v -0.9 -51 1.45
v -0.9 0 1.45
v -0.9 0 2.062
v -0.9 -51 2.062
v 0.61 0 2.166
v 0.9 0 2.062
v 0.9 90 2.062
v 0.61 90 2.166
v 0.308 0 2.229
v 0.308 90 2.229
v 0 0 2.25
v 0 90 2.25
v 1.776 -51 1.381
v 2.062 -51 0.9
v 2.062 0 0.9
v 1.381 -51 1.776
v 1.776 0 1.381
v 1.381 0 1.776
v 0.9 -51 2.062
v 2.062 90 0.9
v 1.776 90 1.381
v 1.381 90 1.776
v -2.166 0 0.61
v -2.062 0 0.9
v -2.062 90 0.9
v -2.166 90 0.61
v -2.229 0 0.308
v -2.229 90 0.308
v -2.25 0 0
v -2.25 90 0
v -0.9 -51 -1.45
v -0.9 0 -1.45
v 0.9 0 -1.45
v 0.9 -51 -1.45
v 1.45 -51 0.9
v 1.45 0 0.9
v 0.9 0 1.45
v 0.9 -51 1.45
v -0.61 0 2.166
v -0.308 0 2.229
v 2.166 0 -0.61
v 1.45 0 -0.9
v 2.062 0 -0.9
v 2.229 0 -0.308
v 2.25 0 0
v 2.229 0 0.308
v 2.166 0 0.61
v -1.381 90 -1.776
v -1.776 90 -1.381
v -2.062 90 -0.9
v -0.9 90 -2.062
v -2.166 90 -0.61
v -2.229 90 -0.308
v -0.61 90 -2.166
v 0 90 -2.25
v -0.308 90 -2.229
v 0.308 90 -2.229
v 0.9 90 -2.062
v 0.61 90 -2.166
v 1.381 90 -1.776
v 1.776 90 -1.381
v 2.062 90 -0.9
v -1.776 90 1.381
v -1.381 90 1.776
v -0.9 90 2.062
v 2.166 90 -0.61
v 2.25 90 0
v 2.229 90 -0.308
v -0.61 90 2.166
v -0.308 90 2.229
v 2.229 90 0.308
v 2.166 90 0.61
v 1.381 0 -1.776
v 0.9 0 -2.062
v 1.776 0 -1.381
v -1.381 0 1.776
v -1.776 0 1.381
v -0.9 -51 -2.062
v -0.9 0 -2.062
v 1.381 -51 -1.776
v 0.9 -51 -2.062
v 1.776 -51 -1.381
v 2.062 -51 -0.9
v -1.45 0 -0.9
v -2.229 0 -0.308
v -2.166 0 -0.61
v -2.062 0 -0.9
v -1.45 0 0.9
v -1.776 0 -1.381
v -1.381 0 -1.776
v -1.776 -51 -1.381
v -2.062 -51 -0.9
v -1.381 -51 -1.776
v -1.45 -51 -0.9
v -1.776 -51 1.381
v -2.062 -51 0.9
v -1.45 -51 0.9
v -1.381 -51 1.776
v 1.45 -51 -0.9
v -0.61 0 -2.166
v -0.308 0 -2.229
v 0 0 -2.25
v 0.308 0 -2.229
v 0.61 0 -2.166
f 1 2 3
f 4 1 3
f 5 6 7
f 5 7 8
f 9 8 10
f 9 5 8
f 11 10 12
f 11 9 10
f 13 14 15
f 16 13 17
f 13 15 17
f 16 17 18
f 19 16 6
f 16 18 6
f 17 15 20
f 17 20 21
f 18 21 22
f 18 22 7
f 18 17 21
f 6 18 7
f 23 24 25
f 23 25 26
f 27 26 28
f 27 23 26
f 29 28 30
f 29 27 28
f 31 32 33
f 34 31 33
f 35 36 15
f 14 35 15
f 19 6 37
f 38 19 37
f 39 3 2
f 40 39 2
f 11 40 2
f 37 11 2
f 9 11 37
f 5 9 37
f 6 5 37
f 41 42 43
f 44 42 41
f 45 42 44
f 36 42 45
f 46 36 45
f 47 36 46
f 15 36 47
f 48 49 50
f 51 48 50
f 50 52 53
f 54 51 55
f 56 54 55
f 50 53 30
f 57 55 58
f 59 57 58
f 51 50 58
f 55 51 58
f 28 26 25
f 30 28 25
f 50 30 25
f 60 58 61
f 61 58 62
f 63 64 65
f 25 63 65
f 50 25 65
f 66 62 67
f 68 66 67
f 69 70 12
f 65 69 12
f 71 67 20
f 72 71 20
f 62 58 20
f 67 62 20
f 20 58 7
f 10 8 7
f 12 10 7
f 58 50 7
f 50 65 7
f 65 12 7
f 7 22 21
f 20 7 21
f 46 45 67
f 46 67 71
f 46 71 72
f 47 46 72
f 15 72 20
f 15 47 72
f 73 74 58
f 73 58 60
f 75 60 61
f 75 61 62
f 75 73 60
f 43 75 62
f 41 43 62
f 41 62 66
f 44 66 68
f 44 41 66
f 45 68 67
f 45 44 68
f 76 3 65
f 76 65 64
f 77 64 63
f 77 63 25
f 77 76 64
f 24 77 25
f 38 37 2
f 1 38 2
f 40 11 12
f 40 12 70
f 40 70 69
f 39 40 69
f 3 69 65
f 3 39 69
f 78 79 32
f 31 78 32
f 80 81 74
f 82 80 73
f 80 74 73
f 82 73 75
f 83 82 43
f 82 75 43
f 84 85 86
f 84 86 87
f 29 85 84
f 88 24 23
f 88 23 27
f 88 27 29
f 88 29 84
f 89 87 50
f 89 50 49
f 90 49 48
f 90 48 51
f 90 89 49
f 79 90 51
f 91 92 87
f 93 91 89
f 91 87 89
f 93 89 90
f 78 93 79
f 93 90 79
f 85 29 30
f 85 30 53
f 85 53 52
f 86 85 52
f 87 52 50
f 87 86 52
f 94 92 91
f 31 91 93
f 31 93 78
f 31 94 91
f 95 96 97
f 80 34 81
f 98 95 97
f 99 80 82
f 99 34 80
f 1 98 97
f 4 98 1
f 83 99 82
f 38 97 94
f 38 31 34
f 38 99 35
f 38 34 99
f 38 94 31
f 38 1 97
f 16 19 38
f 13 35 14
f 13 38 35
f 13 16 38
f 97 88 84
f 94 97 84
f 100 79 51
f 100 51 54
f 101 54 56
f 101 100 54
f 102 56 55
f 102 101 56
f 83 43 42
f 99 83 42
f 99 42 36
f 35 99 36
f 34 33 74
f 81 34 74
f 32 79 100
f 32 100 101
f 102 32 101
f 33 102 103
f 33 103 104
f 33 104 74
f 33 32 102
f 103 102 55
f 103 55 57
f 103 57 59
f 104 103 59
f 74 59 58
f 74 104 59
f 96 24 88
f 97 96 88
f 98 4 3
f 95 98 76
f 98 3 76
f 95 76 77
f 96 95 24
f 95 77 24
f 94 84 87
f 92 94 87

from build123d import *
from build123d import SkipClean  # not in build123d's __all__

# Parameters (mm, degrees)
F1_DEPTH = 51
F2_DEPTH = 90


with BuildPart() as f1:
    # F0 (on Front) → F1 (new body)
    with BuildSketch(Plane.XZ):
        with BuildLine():
            Line((1.45, 0.9), (2.0621590627, 0.9))
            ThreePointArc((2.0621590627, 0.9), (1.5909902577, 1.5909902577), (0.9, 2.0621590627))
            Line((0.9, 2.0621590627), (0.9, 1.45))
            Line((0.9, 1.45), (0, 1.45))
            Line((0, 1.45), (-0.9, 1.45))
            Line((-0.9, 1.45), (-0.9, 2.0621590627))
            ThreePointArc((-0.9, 2.0621590627), (-1.5909902577, 1.5909902577), (-2.0621590627, 0.9))
            Line((-2.0621590627, 0.9), (-1.45, 0.9))
            Line((-1.45, 0.9), (-1.45, 0))
            Line((-1.45, 0), (-1.45, -0.9))
            Line((-1.45, -0.9), (-2.0621590627, -0.9))
            ThreePointArc((-2.0621590627, -0.9), (-1.5909902577, -1.5909902577), (-0.9, -2.0621590627))
            Line((-0.9, -2.0621590627), (-0.9, -1.45))
            Line((-0.9, -1.45), (0, -1.45))
            Line((0, -1.45), (0.9, -1.45))
            Line((0.9, -1.45), (0.9, -2.0621590627))
            ThreePointArc((0.9, -2.0621590627), (1.5909902577, -1.5909902577), (2.0621590627, -0.9))
            Line((2.0621590627, -0.9), (1.45, -0.9))
            Line((1.45, -0.9), (1.45, 0))
            Line((1.45, 0), (1.45, 0.9))
        make_face()
    extrude(amount=F1_DEPTH)

    # F0 (on Front) → F2 (join)
    with BuildSketch(Plane.XZ):
        with BuildLine():
            Line((1.45, 0.9), (2.0621590627, 0.9))
            ThreePointArc((2.0621590627, 0.9), (1.5909902577, 1.5909902577), (0.9, 2.0621590627))
            Line((0.9, 2.0621590627), (0.9, 1.45))
            Line((0.9, 1.45), (0, 1.45))
            Line((0, 1.45), (-0.9, 1.45))
            Line((-0.9, 1.45), (-0.9, 2.0621590627))
            ThreePointArc((-0.9, 2.0621590627), (-1.5909902577, 1.5909902577), (-2.0621590627, 0.9))
            Line((-2.0621590627, 0.9), (-1.45, 0.9))
            Line((-1.45, 0.9), (-1.45, 0))
            Line((-1.45, 0), (-1.45, -0.9))
            Line((-1.45, -0.9), (-2.0621590627, -0.9))
            ThreePointArc((-2.0621590627, -0.9), (-1.5909902577, -1.5909902577), (-0.9, -2.0621590627))
            Line((-0.9, -2.0621590627), (-0.9, -1.45))
            Line((-0.9, -1.45), (0, -1.45))
            Line((0, -1.45), (0.9, -1.45))
            Line((0.9, -1.45), (0.9, -2.0621590627))
            ThreePointArc((0.9, -2.0621590627), (1.5909902577, -1.5909902577), (2.0621590627, -0.9))
            Line((2.0621590627, -0.9), (1.45, -0.9))
            Line((1.45, -0.9), (1.45, 0))
            Line((1.45, 0), (1.45, 0.9))
        make_face()
        with BuildLine():
            Line((0.9, 1.45), (0.9, 2.0621590627))
            ThreePointArc((0.9, 2.0621590627), (0.4596966983, 2.2025392041), (0, 2.25))
            ThreePointArc((0, 2.25), (-0.4596966983, 2.2025392041), (-0.9, 2.0621590627))
            Line((-0.9, 2.0621590627), (-0.9, 1.45))
            Line((-0.9, 1.45), (0, 1.45))
            Line((0, 1.45), (0.9, 1.45))
        make_face()
        with BuildLine():
            Line((-1.45, 0.9), (-2.0621590627, 0.9))
            ThreePointArc((-2.0621590627, 0.9), (-2.2025392041, 0.4596966983), (-2.25, 0))
            ThreePointArc((-2.25, 0), (-2.2025392041, -0.4596966983), (-2.0621590627, -0.9))
            Line((-2.0621590627, -0.9), (-1.45, -0.9))
            Line((-1.45, -0.9), (-1.45, 0))
            Line((-1.45, 0), (-1.45, 0.9))
        make_face()
        with BuildLine():
            ThreePointArc((0, -2.25), (0.4596966983, -2.2025392041), (0.9, -2.0621590627))
            Line((0.9, -2.0621590627), (0.9, -1.45))
            Line((0.9, -1.45), (0, -1.45))
            Line((0, -1.45), (-0.9, -1.45))
            Line((-0.9, -1.45), (-0.9, -2.0621590627))
            ThreePointArc((-0.9, -2.0621590627), (-0.4596966983, -2.2025392041), (0, -2.25))
        make_face()
        with BuildLine():
            ThreePointArc((2.0621590627, -0.9), (2.2025392041, -0.4596966983), (2.25, 0))
            ThreePointArc((2.25, 0), (2.2025392041, 0.4596966983), (2.0621590627, 0.9))
            Line((2.0621590627, 0.9), (1.45, 0.9))
            Line((1.45, 0.9), (1.45, 0))
            Line((1.45, 0), (1.45, -0.9))
            Line((1.45, -0.9), (2.0621590627, -0.9))
        make_face()
    with SkipClean():  # cleaning this boolean's faces spoils the solid; the shape is the same uncleaned
        extrude(amount=-F2_DEPTH)


solid = f1.part
